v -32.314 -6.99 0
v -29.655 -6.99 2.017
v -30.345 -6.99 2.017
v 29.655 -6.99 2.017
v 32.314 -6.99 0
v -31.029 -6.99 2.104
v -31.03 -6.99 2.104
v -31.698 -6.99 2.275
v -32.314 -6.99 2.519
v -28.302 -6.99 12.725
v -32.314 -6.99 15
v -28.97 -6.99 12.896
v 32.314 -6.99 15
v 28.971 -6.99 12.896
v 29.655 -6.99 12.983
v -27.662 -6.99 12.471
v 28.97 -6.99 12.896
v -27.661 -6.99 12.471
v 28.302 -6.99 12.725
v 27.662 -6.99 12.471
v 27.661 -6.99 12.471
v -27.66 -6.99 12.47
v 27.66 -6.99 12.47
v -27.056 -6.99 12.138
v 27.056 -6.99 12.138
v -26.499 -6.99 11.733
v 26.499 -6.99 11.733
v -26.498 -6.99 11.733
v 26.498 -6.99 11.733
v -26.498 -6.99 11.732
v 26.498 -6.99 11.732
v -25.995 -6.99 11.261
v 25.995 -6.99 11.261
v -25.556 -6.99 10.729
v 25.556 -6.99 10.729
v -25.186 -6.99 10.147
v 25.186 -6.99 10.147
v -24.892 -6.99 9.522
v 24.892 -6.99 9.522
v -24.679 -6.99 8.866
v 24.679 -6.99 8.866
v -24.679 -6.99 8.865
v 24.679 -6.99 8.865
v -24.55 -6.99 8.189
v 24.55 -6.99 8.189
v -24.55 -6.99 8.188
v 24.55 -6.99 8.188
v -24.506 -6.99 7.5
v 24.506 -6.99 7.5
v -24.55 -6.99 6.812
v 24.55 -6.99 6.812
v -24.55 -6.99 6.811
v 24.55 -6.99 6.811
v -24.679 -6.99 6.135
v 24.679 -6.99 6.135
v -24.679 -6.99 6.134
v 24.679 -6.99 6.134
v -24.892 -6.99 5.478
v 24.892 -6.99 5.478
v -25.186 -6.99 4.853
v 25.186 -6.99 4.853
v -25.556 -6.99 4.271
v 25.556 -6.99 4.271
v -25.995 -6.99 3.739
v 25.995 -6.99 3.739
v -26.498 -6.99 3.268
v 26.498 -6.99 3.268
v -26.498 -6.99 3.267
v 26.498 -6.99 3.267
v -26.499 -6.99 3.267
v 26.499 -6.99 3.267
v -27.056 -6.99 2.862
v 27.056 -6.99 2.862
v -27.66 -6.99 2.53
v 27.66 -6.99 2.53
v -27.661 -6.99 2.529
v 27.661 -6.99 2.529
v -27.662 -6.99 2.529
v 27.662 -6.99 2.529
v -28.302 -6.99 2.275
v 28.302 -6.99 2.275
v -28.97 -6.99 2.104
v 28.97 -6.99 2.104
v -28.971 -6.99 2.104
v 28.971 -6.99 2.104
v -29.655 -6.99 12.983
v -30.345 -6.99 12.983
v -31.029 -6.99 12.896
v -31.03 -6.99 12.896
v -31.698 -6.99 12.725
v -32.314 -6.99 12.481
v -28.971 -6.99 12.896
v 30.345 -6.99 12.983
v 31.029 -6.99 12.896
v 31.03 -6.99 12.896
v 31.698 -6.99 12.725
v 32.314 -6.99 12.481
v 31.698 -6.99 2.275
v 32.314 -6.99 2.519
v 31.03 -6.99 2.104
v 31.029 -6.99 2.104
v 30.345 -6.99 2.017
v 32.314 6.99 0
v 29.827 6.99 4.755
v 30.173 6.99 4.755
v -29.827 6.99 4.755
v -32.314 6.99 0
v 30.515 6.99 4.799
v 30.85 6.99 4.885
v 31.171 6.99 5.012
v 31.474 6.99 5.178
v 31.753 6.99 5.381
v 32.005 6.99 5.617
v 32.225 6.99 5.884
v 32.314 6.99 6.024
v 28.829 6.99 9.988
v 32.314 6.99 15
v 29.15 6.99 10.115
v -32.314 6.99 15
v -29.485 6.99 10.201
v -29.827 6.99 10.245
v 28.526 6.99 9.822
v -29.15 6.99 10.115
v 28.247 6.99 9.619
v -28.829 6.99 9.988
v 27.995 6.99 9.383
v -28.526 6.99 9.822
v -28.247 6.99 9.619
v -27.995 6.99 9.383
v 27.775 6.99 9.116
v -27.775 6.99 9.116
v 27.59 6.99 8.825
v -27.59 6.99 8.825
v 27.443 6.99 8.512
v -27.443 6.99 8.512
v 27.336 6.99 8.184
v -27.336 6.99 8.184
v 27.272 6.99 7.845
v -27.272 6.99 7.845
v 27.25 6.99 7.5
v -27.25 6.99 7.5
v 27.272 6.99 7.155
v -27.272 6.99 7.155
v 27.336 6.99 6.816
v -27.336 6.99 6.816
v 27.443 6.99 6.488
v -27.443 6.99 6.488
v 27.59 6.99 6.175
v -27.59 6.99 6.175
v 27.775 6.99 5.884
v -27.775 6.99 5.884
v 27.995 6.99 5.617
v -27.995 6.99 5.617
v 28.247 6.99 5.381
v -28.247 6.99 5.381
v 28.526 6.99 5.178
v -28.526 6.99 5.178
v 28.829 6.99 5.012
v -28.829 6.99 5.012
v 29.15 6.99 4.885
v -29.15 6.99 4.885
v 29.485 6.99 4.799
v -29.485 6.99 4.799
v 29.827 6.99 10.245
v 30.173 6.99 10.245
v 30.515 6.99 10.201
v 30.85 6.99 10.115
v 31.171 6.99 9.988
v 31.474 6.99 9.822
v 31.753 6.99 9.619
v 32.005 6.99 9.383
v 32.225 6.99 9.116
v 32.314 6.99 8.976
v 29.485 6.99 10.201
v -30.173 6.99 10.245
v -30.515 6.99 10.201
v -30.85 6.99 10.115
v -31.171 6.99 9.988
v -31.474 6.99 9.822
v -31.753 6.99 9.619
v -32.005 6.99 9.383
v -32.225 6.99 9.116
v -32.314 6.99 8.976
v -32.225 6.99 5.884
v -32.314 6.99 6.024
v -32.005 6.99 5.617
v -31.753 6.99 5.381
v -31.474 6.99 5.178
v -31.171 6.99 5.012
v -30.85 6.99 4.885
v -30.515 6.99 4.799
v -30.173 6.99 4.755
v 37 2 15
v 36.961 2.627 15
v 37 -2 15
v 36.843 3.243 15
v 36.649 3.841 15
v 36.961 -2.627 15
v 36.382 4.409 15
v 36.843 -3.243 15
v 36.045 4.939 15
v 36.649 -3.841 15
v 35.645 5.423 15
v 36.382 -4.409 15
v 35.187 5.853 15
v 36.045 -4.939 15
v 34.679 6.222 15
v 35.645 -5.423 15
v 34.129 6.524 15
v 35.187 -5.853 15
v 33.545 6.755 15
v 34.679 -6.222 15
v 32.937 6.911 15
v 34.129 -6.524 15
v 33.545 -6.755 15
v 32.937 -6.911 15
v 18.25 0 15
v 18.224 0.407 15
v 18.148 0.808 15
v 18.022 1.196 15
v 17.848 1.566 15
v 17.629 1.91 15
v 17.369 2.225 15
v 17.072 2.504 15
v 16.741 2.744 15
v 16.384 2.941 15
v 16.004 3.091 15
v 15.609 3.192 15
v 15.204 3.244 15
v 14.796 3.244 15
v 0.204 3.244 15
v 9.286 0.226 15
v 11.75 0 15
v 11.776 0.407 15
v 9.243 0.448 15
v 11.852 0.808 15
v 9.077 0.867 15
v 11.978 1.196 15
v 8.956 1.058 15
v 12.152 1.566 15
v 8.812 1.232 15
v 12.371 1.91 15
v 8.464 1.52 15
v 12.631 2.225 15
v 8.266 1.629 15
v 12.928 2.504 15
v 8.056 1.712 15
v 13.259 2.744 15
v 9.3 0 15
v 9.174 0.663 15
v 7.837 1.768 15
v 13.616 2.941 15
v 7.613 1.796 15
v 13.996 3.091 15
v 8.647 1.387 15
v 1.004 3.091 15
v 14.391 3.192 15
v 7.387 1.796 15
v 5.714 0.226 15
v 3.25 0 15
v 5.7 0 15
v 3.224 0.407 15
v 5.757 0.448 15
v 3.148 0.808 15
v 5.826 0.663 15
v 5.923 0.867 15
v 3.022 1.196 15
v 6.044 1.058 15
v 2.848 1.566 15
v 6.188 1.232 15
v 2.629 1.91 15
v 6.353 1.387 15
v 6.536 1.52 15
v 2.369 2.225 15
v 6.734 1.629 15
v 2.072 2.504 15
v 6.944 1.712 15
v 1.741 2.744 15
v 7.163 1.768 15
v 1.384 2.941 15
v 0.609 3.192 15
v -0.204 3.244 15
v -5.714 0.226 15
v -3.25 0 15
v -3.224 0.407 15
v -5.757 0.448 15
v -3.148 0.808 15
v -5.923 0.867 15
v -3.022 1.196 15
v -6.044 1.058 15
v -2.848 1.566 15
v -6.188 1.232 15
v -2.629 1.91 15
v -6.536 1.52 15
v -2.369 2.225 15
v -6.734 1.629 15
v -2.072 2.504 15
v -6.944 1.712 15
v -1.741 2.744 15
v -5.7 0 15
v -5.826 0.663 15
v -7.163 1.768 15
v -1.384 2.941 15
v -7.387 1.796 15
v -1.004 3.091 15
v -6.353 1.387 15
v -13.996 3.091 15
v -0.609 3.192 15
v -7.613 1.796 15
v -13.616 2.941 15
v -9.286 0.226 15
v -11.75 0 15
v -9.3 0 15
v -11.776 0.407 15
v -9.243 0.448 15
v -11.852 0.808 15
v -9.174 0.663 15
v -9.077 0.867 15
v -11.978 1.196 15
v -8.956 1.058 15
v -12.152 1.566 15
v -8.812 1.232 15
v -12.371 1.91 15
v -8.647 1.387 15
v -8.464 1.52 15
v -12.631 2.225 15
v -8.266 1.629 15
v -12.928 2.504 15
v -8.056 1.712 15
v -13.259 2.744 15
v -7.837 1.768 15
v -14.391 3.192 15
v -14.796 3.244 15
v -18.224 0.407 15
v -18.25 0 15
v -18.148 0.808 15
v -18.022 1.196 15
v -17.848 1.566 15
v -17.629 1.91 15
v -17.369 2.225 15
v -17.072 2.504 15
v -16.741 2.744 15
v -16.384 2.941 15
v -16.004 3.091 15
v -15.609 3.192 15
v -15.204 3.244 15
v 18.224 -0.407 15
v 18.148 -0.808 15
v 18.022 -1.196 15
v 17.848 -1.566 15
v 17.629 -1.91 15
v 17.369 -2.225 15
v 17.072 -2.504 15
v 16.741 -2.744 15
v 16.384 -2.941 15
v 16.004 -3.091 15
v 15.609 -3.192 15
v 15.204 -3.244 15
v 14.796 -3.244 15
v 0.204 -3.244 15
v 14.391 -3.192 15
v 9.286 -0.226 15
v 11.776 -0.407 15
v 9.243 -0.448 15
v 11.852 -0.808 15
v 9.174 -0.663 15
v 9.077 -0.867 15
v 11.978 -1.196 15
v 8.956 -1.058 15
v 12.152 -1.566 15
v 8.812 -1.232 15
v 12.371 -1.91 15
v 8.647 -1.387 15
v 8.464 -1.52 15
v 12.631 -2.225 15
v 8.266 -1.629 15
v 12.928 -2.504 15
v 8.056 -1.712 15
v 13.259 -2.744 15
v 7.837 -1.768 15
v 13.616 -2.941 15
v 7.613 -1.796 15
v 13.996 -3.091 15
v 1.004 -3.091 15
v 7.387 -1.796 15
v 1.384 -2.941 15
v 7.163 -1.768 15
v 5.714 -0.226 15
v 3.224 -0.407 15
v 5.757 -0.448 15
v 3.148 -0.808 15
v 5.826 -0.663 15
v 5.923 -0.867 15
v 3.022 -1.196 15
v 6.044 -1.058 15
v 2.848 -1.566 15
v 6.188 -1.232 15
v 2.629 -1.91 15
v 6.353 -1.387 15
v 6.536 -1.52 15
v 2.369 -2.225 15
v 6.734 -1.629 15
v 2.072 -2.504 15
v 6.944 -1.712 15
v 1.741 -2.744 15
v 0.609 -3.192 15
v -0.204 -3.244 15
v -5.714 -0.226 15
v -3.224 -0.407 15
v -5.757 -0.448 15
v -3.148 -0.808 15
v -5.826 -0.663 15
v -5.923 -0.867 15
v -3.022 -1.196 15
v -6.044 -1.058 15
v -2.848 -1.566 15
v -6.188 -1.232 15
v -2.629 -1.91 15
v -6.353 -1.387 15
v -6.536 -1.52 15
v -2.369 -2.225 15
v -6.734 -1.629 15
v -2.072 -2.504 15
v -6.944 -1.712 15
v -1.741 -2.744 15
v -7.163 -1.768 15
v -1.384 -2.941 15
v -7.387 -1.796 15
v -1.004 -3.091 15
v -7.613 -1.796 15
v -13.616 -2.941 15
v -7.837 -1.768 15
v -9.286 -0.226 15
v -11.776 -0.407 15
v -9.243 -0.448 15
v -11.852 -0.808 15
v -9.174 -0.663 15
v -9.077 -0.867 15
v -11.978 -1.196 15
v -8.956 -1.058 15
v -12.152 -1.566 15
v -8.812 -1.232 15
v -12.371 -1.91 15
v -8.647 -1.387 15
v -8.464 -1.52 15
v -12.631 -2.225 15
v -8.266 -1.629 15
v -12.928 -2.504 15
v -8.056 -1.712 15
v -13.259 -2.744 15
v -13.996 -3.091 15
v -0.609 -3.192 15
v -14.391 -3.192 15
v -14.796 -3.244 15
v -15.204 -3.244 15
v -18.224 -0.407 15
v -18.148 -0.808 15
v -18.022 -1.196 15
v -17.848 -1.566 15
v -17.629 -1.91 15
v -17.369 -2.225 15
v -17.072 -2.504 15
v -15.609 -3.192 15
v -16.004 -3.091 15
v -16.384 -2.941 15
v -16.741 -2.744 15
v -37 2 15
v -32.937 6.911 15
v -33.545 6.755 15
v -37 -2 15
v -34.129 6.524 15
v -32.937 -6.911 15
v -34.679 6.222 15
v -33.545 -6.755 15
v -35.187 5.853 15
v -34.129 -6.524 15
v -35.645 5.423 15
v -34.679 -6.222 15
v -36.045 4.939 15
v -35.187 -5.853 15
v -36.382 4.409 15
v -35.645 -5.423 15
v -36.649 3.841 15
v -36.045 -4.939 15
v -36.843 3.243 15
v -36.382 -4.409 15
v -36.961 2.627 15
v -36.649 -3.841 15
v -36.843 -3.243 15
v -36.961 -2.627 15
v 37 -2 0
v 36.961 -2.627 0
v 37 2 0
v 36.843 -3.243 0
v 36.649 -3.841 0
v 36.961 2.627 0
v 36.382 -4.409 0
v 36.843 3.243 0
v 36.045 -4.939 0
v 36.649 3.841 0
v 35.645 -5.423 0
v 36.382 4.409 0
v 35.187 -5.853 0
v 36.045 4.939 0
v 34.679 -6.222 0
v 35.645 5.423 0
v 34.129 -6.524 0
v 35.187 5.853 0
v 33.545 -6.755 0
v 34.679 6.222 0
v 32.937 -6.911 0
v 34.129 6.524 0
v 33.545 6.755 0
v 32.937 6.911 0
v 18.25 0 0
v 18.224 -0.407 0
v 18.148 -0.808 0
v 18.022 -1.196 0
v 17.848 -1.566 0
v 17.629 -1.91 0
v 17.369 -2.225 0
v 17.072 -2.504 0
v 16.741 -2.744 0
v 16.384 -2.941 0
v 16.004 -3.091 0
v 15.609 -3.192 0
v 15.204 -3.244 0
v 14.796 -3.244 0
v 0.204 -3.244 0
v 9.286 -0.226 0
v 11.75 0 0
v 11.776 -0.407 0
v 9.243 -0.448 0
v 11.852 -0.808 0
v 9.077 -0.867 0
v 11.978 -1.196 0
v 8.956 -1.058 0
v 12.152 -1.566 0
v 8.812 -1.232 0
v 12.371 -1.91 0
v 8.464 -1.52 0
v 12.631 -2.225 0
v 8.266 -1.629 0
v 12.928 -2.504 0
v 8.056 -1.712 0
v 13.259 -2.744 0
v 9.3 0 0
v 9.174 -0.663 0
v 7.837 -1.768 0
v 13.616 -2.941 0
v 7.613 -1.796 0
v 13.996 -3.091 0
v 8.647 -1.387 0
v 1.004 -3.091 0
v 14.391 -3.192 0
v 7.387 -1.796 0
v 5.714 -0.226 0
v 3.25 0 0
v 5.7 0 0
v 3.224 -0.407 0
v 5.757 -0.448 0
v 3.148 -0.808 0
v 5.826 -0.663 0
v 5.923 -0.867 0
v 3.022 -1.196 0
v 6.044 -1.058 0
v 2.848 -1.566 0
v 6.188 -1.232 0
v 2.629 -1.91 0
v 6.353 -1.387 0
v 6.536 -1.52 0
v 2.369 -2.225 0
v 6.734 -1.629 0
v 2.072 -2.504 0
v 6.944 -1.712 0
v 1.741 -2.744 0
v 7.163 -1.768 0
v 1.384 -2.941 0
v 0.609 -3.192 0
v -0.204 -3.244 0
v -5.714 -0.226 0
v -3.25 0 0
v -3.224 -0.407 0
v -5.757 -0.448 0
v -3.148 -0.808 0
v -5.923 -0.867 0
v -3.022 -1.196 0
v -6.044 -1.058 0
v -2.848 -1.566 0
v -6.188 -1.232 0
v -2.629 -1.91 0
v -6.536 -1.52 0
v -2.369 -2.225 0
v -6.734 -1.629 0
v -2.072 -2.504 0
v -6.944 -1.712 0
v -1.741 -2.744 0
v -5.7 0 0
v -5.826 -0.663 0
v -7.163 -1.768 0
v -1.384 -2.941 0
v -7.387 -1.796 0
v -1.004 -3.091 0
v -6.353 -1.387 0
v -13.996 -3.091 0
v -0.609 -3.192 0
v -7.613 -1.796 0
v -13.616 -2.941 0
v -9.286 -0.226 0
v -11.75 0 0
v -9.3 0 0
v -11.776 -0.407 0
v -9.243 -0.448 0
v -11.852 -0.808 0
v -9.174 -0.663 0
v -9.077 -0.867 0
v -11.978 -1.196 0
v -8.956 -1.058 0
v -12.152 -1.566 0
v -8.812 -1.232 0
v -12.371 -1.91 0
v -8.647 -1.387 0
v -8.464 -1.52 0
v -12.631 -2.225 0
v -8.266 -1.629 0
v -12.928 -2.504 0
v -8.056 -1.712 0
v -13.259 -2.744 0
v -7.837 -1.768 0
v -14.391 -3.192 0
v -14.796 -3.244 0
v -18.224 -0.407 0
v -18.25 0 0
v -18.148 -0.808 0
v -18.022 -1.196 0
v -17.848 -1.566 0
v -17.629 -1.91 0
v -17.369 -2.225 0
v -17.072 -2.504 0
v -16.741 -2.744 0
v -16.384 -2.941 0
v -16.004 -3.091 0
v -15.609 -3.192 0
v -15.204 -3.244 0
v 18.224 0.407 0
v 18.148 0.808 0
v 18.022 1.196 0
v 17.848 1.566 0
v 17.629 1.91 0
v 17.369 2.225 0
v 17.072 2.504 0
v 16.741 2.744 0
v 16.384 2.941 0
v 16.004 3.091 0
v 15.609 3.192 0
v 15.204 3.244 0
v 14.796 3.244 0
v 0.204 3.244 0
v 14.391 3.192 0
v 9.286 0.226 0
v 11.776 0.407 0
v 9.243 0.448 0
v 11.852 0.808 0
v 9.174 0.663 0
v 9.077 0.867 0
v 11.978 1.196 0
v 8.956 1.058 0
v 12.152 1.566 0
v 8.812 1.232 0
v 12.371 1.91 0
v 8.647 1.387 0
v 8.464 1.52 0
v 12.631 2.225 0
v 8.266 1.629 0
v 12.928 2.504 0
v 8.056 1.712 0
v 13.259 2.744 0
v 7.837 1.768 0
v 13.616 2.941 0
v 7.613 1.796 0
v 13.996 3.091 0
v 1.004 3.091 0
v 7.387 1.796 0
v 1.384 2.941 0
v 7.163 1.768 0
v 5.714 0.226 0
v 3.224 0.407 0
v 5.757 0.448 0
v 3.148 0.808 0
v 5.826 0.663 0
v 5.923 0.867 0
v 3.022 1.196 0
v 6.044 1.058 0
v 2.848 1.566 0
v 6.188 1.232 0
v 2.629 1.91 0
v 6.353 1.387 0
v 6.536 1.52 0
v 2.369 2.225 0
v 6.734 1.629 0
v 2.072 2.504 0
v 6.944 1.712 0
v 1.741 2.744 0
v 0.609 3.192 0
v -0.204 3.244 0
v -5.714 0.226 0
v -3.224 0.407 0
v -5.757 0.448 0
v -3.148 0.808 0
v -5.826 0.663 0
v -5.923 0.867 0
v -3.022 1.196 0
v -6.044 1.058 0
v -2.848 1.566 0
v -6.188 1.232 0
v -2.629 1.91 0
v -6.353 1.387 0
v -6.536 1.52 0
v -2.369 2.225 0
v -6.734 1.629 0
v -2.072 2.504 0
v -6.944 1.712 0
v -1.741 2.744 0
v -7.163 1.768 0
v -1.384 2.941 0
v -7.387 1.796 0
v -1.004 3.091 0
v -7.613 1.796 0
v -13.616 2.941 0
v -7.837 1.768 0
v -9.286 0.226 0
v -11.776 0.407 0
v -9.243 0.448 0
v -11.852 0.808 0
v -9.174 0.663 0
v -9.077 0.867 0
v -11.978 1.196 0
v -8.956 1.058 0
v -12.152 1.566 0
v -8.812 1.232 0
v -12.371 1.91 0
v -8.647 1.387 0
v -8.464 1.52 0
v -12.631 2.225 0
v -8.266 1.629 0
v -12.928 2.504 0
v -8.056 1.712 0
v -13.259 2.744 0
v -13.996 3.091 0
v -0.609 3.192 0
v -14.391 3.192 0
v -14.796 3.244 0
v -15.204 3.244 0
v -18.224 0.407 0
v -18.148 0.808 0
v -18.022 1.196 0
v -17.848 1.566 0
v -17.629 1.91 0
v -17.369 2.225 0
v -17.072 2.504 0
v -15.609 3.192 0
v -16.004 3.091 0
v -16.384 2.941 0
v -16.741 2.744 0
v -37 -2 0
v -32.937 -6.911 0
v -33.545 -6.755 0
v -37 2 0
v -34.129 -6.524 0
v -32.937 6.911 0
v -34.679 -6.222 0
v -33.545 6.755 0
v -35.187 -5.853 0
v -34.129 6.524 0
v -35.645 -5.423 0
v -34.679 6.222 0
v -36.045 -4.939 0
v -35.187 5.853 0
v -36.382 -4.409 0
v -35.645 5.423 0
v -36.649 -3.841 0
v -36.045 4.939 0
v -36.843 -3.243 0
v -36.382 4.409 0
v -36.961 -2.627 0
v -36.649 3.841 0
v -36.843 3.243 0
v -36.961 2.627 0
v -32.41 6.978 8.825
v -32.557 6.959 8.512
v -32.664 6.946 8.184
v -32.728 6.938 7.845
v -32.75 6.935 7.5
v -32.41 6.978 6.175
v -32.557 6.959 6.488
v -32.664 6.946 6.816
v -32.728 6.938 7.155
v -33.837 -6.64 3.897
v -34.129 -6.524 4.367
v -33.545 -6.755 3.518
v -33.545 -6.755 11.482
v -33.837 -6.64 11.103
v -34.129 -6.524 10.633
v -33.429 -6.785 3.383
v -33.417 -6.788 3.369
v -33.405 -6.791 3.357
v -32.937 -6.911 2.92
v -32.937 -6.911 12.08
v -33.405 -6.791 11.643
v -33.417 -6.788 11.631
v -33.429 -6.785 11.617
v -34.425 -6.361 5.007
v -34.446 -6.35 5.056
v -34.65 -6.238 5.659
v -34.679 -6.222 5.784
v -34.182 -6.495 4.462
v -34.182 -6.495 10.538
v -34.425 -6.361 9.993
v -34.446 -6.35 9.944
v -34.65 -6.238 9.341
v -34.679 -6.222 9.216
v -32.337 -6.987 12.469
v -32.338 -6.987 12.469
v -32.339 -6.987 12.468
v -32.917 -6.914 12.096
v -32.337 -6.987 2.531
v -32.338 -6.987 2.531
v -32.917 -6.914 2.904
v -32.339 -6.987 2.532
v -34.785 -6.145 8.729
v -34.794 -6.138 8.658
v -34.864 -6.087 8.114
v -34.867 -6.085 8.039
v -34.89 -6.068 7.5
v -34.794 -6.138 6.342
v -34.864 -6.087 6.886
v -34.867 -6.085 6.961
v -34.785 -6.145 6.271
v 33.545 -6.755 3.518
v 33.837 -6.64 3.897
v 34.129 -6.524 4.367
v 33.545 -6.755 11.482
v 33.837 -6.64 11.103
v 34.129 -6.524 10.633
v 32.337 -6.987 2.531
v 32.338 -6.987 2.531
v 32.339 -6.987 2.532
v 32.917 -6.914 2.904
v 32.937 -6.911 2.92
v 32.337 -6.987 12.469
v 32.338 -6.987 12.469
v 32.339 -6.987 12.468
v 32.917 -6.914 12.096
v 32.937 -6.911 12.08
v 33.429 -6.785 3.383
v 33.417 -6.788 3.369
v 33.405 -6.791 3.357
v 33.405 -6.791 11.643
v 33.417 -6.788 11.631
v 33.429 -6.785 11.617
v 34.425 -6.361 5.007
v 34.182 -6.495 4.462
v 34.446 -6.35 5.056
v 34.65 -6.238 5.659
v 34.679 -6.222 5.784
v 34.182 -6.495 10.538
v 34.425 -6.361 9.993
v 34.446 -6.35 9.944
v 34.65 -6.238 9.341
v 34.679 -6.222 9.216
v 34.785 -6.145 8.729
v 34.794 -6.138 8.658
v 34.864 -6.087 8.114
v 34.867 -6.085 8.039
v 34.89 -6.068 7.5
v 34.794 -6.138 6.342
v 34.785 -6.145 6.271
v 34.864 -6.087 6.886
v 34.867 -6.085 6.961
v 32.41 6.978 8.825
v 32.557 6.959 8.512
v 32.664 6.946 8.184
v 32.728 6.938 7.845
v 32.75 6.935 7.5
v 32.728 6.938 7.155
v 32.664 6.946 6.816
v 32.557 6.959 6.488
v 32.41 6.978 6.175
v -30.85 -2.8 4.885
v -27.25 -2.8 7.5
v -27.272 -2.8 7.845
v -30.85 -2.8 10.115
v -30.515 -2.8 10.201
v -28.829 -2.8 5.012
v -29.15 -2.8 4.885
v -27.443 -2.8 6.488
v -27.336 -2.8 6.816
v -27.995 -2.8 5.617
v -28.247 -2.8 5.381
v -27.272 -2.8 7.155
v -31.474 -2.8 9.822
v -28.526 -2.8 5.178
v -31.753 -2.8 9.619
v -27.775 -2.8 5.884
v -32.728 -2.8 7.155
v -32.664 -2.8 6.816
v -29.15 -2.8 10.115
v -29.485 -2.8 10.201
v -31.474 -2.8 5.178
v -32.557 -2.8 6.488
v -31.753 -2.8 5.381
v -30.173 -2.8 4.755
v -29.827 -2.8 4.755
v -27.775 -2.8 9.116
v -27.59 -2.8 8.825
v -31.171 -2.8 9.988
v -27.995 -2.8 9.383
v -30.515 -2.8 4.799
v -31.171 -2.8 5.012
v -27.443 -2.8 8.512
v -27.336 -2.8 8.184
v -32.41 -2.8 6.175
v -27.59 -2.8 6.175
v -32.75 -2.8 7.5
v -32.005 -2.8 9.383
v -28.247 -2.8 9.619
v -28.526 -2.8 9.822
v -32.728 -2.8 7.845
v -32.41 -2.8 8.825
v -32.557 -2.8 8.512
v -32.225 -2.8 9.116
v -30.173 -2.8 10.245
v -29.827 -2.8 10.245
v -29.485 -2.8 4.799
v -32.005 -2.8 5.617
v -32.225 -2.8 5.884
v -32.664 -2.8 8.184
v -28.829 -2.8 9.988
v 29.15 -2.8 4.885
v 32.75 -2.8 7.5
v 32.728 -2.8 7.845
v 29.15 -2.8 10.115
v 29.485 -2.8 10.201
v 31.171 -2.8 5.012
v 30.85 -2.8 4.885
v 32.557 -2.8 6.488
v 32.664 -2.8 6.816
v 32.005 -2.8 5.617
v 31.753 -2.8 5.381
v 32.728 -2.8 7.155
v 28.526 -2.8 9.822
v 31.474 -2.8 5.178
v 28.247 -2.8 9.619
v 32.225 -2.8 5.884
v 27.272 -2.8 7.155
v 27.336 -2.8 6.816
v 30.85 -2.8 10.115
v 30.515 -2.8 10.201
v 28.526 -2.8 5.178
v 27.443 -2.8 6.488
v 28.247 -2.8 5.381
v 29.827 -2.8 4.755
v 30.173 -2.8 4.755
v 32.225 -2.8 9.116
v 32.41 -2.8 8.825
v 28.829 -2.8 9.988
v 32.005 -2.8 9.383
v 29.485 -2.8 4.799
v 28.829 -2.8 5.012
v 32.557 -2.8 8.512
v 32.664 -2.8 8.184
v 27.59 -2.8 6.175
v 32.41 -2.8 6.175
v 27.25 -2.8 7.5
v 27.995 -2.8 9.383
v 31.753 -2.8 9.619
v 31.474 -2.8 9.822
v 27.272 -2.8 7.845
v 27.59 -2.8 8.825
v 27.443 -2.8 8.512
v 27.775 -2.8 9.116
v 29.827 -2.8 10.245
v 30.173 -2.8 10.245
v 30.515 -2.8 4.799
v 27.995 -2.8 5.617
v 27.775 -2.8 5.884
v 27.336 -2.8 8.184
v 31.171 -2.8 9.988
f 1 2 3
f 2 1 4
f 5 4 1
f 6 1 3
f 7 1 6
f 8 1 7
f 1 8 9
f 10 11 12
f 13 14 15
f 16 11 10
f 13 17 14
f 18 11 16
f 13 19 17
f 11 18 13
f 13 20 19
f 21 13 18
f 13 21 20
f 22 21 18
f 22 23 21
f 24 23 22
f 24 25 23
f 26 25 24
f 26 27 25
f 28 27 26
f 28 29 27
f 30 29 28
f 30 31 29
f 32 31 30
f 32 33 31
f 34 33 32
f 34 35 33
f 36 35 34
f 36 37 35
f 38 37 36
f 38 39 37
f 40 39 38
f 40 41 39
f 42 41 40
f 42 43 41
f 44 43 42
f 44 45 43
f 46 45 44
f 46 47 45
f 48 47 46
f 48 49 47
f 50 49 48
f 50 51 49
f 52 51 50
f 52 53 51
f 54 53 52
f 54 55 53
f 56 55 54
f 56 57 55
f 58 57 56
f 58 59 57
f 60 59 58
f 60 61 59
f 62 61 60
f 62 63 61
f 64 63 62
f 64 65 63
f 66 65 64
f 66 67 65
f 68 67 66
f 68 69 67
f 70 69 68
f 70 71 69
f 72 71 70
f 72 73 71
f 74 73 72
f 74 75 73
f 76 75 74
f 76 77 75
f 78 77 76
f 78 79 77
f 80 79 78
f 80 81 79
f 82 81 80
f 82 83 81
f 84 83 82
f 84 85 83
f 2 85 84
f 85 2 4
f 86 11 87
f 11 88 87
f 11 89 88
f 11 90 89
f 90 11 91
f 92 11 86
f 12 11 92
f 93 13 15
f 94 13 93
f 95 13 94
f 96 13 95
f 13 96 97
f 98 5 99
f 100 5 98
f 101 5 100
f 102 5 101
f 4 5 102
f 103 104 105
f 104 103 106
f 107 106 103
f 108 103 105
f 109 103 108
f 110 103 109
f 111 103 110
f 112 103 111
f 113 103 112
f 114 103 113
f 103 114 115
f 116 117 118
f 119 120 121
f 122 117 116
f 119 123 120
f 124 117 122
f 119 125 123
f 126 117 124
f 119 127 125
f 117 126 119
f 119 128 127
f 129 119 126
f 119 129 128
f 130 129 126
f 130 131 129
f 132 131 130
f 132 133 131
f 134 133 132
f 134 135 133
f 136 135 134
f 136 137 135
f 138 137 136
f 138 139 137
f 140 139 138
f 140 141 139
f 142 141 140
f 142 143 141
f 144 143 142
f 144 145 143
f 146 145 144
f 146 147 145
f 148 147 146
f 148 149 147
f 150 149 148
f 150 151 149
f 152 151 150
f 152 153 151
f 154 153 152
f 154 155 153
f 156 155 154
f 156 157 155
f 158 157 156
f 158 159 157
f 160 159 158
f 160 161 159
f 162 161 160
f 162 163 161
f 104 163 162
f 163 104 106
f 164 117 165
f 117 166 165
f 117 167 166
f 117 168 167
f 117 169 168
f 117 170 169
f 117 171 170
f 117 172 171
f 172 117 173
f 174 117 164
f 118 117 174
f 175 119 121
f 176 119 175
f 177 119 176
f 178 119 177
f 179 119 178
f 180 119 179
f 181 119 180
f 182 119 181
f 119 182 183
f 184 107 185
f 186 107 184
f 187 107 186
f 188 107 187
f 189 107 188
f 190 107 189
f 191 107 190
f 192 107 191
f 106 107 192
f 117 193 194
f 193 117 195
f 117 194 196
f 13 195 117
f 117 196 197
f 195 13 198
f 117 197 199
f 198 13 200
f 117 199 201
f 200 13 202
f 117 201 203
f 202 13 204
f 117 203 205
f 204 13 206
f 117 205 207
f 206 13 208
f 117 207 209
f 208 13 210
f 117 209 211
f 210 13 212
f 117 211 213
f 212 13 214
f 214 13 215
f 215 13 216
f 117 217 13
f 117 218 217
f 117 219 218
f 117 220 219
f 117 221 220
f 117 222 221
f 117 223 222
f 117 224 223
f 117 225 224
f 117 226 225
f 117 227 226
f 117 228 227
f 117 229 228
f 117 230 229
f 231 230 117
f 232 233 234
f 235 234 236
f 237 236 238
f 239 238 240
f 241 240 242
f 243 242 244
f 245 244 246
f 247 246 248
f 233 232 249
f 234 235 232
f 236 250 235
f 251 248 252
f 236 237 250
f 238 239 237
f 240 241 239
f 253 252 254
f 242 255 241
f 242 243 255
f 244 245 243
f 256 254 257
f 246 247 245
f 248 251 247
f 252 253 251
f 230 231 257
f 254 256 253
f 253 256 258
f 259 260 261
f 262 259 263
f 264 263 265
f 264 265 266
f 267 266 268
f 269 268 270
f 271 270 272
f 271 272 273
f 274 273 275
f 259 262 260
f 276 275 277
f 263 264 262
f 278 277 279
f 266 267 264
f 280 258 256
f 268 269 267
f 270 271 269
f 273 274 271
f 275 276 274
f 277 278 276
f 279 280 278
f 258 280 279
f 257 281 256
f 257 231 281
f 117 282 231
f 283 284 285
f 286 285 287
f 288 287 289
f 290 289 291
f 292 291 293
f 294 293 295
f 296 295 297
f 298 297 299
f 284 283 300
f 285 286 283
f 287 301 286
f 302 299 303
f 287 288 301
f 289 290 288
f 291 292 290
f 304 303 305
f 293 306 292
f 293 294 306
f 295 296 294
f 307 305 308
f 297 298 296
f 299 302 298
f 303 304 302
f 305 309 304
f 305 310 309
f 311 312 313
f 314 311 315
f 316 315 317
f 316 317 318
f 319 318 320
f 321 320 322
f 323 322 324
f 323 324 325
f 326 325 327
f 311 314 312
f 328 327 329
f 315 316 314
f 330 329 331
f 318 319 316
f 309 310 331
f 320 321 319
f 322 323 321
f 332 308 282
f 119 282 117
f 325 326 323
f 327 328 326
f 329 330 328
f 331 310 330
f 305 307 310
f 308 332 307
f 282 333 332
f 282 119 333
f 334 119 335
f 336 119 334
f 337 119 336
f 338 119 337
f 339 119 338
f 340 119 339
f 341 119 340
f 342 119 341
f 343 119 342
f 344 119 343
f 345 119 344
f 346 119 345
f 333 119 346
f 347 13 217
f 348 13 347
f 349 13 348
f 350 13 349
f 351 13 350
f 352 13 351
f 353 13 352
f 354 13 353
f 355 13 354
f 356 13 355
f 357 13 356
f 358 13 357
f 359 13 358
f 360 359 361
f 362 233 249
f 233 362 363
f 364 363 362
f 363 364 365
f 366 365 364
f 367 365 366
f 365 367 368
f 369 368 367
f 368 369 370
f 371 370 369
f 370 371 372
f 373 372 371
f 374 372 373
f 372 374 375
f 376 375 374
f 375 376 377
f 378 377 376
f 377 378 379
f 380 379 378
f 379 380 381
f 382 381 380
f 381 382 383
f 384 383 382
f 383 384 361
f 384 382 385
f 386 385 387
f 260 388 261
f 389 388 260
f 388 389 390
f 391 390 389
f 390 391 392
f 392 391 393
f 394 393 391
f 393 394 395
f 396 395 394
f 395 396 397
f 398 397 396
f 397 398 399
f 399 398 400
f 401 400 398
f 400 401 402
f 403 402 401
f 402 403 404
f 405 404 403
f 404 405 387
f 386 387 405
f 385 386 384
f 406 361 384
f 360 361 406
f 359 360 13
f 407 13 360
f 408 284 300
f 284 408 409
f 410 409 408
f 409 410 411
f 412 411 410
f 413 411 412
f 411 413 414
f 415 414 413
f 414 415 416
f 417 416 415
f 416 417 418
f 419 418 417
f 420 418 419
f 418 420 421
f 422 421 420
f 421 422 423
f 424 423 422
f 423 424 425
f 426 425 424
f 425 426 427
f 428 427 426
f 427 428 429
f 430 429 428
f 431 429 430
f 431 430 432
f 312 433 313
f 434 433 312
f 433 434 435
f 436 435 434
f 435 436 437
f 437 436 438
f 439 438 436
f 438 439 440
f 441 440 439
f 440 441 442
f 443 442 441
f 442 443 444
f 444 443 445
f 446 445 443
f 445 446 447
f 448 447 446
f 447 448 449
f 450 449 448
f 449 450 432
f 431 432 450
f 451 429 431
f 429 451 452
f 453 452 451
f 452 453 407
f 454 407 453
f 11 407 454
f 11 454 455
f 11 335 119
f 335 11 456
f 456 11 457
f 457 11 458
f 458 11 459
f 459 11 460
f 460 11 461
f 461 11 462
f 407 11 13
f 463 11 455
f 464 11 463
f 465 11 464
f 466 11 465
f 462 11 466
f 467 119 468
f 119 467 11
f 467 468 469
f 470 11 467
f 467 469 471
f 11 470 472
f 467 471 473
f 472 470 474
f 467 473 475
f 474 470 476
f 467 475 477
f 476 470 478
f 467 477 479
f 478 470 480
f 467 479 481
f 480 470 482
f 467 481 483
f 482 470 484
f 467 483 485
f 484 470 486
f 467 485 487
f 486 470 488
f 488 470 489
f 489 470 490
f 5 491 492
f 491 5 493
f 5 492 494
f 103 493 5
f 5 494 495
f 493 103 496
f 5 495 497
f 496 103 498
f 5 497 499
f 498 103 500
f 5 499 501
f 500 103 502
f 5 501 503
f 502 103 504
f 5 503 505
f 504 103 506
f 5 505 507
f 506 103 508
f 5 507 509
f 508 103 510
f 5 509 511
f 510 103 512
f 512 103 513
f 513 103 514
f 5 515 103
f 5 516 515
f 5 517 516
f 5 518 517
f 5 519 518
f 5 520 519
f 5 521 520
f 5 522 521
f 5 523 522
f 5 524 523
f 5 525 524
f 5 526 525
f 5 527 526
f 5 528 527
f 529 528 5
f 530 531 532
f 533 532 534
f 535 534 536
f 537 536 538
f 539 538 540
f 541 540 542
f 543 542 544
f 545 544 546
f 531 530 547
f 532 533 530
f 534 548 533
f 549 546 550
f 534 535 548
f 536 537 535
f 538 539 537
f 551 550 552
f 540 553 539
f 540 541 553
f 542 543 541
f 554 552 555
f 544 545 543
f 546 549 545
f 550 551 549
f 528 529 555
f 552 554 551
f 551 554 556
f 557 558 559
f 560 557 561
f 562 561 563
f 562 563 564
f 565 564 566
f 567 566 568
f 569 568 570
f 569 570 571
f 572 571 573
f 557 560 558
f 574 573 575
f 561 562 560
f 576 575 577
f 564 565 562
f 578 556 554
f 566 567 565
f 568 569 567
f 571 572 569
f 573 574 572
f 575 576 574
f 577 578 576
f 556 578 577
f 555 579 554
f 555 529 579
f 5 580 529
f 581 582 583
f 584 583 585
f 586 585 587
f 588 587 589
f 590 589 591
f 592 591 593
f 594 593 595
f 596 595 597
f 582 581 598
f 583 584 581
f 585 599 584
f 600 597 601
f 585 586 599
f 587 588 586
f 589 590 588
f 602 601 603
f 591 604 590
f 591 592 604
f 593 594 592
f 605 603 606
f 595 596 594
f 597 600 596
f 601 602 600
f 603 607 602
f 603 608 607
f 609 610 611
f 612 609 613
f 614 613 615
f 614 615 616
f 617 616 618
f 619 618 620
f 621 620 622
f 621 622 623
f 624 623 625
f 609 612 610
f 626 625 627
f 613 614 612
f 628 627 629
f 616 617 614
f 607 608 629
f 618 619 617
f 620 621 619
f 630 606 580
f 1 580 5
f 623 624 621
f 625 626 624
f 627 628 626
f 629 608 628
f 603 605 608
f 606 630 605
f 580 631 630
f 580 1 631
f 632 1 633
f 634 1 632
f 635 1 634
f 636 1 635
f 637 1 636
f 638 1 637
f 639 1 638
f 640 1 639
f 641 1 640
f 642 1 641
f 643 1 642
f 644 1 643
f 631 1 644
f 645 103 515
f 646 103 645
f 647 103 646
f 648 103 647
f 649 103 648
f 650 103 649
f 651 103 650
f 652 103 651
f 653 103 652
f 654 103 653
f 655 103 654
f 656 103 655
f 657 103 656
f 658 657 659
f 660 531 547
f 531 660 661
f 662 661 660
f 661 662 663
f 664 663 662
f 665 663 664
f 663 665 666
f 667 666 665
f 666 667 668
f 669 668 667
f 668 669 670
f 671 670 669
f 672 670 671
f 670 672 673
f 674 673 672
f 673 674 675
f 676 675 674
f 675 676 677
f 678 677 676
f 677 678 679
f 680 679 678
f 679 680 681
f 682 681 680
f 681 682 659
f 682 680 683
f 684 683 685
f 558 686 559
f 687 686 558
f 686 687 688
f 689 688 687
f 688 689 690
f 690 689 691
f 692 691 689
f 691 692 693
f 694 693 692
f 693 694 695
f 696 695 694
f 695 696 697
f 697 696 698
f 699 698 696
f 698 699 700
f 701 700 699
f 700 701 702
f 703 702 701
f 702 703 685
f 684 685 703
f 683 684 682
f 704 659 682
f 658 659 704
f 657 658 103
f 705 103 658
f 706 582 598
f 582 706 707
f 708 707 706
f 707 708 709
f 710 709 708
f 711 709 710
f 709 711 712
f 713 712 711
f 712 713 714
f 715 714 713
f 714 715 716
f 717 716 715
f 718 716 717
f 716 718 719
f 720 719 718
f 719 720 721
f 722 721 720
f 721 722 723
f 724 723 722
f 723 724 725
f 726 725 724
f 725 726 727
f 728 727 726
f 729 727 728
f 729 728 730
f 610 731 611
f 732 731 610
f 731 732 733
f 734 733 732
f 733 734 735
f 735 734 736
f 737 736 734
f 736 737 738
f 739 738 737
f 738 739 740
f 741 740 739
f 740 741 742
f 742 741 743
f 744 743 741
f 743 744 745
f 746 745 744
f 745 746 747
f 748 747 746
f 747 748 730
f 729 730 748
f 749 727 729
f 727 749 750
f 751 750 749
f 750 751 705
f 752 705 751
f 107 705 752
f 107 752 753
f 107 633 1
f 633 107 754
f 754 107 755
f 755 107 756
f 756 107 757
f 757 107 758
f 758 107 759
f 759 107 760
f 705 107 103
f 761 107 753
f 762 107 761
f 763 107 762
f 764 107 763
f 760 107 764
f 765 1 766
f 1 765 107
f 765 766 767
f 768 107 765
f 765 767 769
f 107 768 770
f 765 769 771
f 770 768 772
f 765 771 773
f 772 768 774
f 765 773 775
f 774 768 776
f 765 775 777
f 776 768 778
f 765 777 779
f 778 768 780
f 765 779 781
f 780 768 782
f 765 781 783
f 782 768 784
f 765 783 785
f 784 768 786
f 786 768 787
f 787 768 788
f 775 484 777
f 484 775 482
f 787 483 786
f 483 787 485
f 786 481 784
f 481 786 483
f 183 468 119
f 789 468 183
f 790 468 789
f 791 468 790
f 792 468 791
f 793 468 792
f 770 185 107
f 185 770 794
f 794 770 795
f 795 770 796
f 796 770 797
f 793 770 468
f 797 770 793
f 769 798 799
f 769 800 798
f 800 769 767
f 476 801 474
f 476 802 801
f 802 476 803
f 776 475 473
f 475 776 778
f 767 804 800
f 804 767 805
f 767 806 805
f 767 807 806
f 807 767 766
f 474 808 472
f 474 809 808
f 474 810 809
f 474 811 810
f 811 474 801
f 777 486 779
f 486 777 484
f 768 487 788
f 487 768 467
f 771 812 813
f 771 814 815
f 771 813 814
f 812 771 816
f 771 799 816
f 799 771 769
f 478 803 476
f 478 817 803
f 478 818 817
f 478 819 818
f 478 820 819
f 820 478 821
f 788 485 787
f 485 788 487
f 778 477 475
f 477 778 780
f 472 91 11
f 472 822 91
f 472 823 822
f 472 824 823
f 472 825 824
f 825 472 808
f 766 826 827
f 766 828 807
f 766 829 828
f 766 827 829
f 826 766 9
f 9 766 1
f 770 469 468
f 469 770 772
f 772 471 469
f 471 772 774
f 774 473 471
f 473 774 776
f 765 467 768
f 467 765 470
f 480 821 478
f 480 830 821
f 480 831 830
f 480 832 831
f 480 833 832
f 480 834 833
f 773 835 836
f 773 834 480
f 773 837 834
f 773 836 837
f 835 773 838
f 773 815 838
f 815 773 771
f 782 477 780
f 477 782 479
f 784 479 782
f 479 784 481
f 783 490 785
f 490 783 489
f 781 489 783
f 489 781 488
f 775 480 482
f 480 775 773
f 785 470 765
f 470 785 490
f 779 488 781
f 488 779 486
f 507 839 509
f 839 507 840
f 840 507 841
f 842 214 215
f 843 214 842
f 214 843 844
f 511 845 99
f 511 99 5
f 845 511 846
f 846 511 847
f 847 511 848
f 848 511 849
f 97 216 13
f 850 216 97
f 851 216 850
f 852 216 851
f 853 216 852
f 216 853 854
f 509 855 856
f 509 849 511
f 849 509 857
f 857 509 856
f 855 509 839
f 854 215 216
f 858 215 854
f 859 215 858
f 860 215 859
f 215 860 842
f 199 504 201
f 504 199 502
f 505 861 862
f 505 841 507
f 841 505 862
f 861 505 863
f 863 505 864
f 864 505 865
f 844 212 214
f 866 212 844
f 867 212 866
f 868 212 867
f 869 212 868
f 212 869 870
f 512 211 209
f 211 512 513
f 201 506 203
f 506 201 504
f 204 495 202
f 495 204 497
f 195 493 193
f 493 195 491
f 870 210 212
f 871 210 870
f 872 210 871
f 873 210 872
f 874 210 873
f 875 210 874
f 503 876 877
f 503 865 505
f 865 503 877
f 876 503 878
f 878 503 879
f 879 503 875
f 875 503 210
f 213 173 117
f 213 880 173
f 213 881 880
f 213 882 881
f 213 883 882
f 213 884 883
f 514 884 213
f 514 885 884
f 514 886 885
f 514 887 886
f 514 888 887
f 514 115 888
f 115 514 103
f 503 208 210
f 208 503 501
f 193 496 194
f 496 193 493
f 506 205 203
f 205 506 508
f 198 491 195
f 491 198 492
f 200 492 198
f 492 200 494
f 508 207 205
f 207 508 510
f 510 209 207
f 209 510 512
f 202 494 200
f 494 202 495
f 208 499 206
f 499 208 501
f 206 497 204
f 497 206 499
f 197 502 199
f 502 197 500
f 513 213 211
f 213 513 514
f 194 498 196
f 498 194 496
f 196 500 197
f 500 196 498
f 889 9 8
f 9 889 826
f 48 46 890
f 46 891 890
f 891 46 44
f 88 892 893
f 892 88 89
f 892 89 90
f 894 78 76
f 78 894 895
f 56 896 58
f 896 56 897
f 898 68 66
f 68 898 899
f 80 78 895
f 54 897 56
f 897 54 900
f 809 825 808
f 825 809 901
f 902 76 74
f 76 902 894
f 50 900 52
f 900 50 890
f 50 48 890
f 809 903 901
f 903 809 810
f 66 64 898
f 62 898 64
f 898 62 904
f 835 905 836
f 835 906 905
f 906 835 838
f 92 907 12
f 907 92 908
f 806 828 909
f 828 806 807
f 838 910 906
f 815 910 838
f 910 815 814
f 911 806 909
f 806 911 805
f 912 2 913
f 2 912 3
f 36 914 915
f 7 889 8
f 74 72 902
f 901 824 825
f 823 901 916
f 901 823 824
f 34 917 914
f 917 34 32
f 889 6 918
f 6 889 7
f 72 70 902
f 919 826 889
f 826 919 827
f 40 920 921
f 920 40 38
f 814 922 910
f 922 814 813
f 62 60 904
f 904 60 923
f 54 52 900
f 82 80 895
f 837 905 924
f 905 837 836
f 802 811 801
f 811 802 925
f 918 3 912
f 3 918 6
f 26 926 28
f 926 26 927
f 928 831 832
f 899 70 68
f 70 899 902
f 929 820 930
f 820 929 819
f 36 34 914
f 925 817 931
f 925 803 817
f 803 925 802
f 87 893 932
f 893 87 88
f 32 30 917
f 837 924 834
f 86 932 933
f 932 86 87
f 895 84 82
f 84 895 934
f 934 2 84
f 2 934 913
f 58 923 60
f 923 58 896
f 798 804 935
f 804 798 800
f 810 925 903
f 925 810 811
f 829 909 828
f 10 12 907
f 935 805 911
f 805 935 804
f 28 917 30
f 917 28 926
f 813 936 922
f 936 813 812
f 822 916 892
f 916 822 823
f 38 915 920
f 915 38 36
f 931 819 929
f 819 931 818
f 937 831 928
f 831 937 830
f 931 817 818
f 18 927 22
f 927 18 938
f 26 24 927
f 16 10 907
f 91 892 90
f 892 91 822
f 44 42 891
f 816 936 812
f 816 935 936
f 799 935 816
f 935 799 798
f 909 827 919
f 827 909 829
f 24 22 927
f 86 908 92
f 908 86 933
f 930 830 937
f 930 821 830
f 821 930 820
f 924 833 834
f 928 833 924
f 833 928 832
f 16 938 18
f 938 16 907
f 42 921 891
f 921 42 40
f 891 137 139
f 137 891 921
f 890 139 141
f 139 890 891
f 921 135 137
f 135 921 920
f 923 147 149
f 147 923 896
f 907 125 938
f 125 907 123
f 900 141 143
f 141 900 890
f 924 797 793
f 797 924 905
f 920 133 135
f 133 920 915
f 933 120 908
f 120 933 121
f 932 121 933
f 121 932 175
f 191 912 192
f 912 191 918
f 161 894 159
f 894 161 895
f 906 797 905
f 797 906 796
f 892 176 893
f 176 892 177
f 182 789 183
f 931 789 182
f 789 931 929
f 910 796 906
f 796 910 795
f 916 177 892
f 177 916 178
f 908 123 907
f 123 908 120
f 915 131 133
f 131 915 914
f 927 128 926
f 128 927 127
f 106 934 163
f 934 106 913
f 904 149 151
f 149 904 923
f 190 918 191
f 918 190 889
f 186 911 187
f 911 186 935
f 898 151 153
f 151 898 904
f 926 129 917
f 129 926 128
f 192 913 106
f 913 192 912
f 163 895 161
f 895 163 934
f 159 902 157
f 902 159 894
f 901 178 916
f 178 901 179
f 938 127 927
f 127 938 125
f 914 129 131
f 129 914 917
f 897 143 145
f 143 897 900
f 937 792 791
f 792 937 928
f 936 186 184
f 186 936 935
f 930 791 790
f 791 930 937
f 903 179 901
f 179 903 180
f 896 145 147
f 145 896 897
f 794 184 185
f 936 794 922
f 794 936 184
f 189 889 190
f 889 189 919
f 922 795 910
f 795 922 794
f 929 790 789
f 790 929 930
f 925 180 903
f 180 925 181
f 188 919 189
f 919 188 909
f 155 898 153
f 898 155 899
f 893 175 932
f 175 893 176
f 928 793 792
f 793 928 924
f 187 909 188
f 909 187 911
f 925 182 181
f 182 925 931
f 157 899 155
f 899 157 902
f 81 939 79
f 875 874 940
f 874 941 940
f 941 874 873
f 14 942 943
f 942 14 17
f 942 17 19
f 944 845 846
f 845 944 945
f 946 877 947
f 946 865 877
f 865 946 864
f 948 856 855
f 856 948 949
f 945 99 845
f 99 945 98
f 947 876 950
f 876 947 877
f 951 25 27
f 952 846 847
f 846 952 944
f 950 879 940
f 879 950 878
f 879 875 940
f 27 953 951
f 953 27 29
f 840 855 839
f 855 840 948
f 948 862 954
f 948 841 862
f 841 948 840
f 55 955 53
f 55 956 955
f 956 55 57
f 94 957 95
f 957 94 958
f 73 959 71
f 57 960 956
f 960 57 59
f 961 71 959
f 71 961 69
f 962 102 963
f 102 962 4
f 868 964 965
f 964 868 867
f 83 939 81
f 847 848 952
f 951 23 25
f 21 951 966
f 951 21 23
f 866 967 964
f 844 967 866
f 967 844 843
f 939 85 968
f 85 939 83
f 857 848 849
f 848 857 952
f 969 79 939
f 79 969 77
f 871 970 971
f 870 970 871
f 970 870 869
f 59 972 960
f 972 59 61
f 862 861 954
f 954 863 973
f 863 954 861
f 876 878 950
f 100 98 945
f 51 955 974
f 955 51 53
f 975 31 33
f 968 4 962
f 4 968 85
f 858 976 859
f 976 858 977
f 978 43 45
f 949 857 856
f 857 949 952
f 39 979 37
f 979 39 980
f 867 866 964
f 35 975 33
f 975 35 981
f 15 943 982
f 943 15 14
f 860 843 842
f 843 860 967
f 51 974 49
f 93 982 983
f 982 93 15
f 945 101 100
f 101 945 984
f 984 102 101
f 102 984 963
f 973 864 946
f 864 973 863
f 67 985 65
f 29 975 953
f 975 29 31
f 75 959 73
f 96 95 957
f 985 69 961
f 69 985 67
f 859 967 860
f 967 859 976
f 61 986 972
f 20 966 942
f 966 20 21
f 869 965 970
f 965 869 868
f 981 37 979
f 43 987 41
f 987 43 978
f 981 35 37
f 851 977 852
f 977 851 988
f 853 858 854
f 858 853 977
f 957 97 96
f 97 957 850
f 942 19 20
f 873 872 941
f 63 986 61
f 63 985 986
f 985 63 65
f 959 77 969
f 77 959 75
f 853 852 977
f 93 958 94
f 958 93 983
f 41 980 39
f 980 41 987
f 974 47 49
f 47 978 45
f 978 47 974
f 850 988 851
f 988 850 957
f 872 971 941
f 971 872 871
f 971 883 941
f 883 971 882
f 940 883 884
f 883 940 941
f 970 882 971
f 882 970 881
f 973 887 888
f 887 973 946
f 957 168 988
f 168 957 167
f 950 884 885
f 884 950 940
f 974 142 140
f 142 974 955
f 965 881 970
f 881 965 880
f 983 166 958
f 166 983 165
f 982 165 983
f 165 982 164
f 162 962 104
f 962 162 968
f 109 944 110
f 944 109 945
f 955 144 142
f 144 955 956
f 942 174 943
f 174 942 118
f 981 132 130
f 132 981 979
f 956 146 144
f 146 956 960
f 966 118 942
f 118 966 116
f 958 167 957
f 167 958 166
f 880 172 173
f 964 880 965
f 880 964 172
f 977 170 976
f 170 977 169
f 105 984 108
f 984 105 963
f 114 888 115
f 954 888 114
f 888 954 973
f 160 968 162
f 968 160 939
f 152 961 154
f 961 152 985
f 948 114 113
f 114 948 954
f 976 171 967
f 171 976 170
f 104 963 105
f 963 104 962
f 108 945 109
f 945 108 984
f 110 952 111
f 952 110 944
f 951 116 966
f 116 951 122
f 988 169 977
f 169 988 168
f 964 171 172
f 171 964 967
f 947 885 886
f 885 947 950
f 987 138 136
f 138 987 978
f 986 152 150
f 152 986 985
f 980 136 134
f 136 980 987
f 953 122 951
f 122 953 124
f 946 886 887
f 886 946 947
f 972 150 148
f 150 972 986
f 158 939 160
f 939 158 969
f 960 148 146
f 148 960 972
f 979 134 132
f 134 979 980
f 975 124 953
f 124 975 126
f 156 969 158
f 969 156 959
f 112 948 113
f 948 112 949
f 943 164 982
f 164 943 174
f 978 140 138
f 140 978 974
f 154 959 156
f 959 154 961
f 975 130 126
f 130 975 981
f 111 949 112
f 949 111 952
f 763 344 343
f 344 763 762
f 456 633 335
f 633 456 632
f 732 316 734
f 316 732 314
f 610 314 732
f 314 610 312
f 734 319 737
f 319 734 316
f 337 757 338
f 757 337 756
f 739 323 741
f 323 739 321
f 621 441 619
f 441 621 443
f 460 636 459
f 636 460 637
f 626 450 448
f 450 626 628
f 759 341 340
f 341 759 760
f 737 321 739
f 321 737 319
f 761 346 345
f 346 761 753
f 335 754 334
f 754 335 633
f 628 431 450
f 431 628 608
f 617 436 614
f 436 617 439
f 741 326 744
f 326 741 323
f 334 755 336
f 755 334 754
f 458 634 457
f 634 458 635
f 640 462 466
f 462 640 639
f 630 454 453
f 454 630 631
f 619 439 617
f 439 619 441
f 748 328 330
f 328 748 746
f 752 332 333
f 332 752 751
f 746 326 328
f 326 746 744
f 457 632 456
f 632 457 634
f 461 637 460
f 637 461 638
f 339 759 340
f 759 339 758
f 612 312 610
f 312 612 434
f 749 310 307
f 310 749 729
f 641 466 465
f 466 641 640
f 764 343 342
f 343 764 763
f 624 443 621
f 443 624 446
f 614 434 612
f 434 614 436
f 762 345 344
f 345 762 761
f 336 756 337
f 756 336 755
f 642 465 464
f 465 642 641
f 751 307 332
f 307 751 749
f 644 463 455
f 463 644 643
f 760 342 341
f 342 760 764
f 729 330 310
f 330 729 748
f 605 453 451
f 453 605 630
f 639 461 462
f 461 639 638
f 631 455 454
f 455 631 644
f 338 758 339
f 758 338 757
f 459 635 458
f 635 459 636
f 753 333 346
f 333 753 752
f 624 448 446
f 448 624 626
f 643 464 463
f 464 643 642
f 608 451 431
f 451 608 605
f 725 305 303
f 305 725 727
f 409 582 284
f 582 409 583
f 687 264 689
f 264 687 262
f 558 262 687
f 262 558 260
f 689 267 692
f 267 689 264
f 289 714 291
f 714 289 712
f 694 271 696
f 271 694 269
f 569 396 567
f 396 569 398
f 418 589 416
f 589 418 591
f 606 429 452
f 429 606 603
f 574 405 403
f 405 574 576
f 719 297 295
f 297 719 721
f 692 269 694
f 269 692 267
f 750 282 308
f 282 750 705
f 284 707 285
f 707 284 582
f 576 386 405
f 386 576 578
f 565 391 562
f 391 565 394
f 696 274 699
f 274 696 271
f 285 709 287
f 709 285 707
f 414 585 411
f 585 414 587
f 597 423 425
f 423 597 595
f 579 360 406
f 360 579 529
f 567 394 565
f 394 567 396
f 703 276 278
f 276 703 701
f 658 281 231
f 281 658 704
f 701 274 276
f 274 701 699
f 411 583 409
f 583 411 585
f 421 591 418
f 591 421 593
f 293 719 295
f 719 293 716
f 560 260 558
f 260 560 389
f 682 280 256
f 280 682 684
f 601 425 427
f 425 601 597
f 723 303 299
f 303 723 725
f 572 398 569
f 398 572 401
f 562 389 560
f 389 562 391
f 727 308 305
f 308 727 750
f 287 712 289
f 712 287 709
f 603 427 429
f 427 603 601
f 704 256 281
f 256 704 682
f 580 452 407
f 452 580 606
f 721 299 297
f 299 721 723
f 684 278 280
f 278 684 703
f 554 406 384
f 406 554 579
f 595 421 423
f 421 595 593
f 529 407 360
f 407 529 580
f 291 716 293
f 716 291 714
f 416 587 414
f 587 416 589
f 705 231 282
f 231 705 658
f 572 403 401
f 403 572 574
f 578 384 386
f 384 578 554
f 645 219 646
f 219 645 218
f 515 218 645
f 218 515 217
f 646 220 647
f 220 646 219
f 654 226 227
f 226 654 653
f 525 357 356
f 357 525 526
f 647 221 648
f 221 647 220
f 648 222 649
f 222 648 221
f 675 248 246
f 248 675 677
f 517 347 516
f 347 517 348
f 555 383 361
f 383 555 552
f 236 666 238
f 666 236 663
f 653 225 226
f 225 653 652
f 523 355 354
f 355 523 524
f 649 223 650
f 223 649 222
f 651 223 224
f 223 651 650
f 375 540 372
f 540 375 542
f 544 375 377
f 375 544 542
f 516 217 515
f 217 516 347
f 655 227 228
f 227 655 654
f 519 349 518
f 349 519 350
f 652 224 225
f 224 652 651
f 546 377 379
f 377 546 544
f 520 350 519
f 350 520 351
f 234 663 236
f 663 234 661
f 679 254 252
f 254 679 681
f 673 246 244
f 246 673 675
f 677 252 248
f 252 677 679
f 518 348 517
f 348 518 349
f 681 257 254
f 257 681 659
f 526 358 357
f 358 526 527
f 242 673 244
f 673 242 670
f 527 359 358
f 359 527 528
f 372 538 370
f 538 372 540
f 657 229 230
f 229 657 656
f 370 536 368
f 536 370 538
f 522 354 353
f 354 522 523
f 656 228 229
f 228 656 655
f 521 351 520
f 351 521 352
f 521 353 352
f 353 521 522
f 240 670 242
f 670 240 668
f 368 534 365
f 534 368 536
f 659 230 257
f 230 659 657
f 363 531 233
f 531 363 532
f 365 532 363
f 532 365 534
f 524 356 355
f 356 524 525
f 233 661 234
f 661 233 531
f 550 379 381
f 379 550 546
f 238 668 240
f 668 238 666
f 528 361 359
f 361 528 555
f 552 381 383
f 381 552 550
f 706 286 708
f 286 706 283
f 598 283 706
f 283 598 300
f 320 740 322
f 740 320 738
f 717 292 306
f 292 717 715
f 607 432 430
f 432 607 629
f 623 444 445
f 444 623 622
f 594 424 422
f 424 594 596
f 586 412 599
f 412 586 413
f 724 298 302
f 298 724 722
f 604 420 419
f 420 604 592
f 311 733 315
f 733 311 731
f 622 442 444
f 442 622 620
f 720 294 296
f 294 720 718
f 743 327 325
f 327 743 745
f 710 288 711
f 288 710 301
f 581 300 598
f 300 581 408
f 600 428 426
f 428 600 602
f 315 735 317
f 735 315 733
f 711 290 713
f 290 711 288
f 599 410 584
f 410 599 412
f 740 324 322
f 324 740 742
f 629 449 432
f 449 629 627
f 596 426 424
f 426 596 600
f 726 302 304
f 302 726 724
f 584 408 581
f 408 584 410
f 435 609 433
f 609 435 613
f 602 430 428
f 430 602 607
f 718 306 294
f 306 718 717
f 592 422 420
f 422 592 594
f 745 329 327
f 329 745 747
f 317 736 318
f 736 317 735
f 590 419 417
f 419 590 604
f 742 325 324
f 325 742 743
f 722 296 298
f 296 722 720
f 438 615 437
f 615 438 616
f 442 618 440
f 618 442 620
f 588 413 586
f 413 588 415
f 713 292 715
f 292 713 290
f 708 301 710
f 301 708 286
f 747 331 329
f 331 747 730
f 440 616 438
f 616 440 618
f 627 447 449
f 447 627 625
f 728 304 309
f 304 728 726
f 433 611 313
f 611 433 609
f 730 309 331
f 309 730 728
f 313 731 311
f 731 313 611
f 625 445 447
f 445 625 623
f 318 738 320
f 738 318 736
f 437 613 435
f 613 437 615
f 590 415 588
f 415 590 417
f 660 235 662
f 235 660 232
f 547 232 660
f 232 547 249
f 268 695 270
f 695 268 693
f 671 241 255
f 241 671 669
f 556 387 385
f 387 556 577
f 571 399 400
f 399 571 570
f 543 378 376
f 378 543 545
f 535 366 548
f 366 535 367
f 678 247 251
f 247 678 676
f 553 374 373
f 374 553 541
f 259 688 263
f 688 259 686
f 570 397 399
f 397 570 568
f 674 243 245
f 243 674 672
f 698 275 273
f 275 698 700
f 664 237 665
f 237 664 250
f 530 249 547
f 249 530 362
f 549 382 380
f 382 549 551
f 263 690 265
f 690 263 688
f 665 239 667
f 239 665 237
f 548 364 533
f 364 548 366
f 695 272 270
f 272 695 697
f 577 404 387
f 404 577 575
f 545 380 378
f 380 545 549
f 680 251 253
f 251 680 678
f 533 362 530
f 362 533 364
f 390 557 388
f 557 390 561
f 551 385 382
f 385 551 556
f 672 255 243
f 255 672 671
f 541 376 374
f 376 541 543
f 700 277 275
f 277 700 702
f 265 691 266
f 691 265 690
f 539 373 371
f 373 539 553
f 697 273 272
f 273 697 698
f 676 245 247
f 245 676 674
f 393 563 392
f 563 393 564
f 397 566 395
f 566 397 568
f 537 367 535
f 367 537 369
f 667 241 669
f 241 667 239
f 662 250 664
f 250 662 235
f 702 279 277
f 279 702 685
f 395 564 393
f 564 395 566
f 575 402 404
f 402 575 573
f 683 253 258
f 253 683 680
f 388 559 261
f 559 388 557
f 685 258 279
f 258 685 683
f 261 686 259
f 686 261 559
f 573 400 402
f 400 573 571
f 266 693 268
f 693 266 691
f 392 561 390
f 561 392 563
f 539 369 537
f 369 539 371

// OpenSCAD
$fn = 50;


difference() {
	union() {
		hull() {
			translate(v = [-17.0000000000, 2.0000000000, 0]) {
				cylinder(h = 15, r = 5);
			}
			translate(v = [17.0000000000, 2.0000000000, 0]) {
				cylinder(h = 15, r = 5);
			}
			translate(v = [-17.0000000000, -2.0000000000, 0]) {
				cylinder(h = 15, r = 5);
			}
			translate(v = [17.0000000000, -2.0000000000, 0]) {
				cylinder(h = 15, r = 5);
			}
		}
		translate(v = [-22.5000000000, 0.0000000000, 0]) {
			hull() {
				translate(v = [-9.5000000000, 2.0000000000, 0]) {
					cylinder(h = 15, r = 5);
				}
				translate(v = [9.5000000000, 2.0000000000, 0]) {
					cylinder(h = 15, r = 5);
				}
				translate(v = [-9.5000000000, -2.0000000000, 0]) {
					cylinder(h = 15, r = 5);
				}
				translate(v = [9.5000000000, -2.0000000000, 0]) {
					cylinder(h = 15, r = 5);
				}
			}
		}
		translate(v = [22.5000000000, 0.0000000000, 0]) {
			hull() {
				translate(v = [-9.5000000000, 2.0000000000, 0]) {
					cylinder(h = 15, r = 5);
				}
				translate(v = [9.5000000000, 2.0000000000, 0]) {
					cylinder(h = 15, r = 5);
				}
				translate(v = [-9.5000000000, -2.0000000000, 0]) {
					cylinder(h = 15, r = 5);
				}
				translate(v = [9.5000000000, -2.0000000000, 0]) {
					cylinder(h = 15, r = 5);
				}
			}
		}
	}
	union() {
		translate(v = [-30.0000000000, -7.0000000000, 7.5000000000]) {
			rotate(a = [90, 0, 0]) {
				difference() {
					union() {
						#translate(v = [0, 0, -14.0000000000]) {
							cylinder(h = 14, r = 2.2500000000);
						}
						#translate(v = [0, 0, -4.2000000000]) {
							cylinder(h = 4.2000000000, r1 = 2.7500000000, r2 = 5.5000000000);
						}
						#translate(v = [0, 0, -14.0000000000]) {
							cylinder(h = 14, r = 2.7500000000);
						}
						#translate(v = [0, 0, -14.0000000000]) {
							cylinder(h = 14, r = 2.2500000000);
						}
					}
					union();
				}
			}
		}
		translate(v = [30.0000000000, -7.0000000000, 7.5000000000]) {
			rotate(a = [90, 0, 0]) {
				difference() {
					union() {
						#translate(v = [0, 0, -14.0000000000]) {
							cylinder(h = 14, r = 2.2500000000);
						}
						#translate(v = [0, 0, -4.2000000000]) {
							cylinder(h = 4.2000000000, r1 = 2.7500000000, r2 = 5.5000000000);
						}
						#translate(v = [0, 0, -14.0000000000]) {
							cylinder(h = 14, r = 2.7500000000);
						}
						#translate(v = [0, 0, -14.0000000000]) {
							cylinder(h = 14, r = 2.2500000000);
						}
					}
					union();
				}
			}
		}
		translate(v = [-15.0000000000, 0.0000000000, 0]) {
			translate(v = [0, 0, -100]) {
				cylinder(h = 200, r = 3.2500000000);
			}
		}
		translate(v = [0, 0, -100]) {
			cylinder(h = 200, r = 3.2500000000);
		}
		translate(v = [15.0000000000, 0.0000000000, 0]) {
			translate(v = [0, 0, -100]) {
				cylinder(h = 200, r = 3.2500000000);
			}
		}
		translate(v = [-15.0000000000, 0.0000000000, 0]) {
			translate(v = [0, 0, -100]) {
				cylinder(h = 200, r = 1.8000000000);
			}
		}
		translate(v = [-7.5000000000, 0.0000000000, 0]) {
			translate(v = [0, 0, -100]) {
				cylinder(h = 200, r = 1.8000000000);
			}
		}
		translate(v = [0, 0, -100]) {
			cylinder(h = 200, r = 1.8000000000);
		}
		translate(v = [7.5000000000, 0.0000000000, 0]) {
			translate(v = [0, 0, -100]) {
				cylinder(h = 200, r = 1.8000000000);
			}
		}
		translate(v = [15.0000000000, 0.0000000000, 0]) {
			translate(v = [0, 0, -100]) {
				cylinder(h = 200, r = 1.8000000000);
			}
		}
	}
}
